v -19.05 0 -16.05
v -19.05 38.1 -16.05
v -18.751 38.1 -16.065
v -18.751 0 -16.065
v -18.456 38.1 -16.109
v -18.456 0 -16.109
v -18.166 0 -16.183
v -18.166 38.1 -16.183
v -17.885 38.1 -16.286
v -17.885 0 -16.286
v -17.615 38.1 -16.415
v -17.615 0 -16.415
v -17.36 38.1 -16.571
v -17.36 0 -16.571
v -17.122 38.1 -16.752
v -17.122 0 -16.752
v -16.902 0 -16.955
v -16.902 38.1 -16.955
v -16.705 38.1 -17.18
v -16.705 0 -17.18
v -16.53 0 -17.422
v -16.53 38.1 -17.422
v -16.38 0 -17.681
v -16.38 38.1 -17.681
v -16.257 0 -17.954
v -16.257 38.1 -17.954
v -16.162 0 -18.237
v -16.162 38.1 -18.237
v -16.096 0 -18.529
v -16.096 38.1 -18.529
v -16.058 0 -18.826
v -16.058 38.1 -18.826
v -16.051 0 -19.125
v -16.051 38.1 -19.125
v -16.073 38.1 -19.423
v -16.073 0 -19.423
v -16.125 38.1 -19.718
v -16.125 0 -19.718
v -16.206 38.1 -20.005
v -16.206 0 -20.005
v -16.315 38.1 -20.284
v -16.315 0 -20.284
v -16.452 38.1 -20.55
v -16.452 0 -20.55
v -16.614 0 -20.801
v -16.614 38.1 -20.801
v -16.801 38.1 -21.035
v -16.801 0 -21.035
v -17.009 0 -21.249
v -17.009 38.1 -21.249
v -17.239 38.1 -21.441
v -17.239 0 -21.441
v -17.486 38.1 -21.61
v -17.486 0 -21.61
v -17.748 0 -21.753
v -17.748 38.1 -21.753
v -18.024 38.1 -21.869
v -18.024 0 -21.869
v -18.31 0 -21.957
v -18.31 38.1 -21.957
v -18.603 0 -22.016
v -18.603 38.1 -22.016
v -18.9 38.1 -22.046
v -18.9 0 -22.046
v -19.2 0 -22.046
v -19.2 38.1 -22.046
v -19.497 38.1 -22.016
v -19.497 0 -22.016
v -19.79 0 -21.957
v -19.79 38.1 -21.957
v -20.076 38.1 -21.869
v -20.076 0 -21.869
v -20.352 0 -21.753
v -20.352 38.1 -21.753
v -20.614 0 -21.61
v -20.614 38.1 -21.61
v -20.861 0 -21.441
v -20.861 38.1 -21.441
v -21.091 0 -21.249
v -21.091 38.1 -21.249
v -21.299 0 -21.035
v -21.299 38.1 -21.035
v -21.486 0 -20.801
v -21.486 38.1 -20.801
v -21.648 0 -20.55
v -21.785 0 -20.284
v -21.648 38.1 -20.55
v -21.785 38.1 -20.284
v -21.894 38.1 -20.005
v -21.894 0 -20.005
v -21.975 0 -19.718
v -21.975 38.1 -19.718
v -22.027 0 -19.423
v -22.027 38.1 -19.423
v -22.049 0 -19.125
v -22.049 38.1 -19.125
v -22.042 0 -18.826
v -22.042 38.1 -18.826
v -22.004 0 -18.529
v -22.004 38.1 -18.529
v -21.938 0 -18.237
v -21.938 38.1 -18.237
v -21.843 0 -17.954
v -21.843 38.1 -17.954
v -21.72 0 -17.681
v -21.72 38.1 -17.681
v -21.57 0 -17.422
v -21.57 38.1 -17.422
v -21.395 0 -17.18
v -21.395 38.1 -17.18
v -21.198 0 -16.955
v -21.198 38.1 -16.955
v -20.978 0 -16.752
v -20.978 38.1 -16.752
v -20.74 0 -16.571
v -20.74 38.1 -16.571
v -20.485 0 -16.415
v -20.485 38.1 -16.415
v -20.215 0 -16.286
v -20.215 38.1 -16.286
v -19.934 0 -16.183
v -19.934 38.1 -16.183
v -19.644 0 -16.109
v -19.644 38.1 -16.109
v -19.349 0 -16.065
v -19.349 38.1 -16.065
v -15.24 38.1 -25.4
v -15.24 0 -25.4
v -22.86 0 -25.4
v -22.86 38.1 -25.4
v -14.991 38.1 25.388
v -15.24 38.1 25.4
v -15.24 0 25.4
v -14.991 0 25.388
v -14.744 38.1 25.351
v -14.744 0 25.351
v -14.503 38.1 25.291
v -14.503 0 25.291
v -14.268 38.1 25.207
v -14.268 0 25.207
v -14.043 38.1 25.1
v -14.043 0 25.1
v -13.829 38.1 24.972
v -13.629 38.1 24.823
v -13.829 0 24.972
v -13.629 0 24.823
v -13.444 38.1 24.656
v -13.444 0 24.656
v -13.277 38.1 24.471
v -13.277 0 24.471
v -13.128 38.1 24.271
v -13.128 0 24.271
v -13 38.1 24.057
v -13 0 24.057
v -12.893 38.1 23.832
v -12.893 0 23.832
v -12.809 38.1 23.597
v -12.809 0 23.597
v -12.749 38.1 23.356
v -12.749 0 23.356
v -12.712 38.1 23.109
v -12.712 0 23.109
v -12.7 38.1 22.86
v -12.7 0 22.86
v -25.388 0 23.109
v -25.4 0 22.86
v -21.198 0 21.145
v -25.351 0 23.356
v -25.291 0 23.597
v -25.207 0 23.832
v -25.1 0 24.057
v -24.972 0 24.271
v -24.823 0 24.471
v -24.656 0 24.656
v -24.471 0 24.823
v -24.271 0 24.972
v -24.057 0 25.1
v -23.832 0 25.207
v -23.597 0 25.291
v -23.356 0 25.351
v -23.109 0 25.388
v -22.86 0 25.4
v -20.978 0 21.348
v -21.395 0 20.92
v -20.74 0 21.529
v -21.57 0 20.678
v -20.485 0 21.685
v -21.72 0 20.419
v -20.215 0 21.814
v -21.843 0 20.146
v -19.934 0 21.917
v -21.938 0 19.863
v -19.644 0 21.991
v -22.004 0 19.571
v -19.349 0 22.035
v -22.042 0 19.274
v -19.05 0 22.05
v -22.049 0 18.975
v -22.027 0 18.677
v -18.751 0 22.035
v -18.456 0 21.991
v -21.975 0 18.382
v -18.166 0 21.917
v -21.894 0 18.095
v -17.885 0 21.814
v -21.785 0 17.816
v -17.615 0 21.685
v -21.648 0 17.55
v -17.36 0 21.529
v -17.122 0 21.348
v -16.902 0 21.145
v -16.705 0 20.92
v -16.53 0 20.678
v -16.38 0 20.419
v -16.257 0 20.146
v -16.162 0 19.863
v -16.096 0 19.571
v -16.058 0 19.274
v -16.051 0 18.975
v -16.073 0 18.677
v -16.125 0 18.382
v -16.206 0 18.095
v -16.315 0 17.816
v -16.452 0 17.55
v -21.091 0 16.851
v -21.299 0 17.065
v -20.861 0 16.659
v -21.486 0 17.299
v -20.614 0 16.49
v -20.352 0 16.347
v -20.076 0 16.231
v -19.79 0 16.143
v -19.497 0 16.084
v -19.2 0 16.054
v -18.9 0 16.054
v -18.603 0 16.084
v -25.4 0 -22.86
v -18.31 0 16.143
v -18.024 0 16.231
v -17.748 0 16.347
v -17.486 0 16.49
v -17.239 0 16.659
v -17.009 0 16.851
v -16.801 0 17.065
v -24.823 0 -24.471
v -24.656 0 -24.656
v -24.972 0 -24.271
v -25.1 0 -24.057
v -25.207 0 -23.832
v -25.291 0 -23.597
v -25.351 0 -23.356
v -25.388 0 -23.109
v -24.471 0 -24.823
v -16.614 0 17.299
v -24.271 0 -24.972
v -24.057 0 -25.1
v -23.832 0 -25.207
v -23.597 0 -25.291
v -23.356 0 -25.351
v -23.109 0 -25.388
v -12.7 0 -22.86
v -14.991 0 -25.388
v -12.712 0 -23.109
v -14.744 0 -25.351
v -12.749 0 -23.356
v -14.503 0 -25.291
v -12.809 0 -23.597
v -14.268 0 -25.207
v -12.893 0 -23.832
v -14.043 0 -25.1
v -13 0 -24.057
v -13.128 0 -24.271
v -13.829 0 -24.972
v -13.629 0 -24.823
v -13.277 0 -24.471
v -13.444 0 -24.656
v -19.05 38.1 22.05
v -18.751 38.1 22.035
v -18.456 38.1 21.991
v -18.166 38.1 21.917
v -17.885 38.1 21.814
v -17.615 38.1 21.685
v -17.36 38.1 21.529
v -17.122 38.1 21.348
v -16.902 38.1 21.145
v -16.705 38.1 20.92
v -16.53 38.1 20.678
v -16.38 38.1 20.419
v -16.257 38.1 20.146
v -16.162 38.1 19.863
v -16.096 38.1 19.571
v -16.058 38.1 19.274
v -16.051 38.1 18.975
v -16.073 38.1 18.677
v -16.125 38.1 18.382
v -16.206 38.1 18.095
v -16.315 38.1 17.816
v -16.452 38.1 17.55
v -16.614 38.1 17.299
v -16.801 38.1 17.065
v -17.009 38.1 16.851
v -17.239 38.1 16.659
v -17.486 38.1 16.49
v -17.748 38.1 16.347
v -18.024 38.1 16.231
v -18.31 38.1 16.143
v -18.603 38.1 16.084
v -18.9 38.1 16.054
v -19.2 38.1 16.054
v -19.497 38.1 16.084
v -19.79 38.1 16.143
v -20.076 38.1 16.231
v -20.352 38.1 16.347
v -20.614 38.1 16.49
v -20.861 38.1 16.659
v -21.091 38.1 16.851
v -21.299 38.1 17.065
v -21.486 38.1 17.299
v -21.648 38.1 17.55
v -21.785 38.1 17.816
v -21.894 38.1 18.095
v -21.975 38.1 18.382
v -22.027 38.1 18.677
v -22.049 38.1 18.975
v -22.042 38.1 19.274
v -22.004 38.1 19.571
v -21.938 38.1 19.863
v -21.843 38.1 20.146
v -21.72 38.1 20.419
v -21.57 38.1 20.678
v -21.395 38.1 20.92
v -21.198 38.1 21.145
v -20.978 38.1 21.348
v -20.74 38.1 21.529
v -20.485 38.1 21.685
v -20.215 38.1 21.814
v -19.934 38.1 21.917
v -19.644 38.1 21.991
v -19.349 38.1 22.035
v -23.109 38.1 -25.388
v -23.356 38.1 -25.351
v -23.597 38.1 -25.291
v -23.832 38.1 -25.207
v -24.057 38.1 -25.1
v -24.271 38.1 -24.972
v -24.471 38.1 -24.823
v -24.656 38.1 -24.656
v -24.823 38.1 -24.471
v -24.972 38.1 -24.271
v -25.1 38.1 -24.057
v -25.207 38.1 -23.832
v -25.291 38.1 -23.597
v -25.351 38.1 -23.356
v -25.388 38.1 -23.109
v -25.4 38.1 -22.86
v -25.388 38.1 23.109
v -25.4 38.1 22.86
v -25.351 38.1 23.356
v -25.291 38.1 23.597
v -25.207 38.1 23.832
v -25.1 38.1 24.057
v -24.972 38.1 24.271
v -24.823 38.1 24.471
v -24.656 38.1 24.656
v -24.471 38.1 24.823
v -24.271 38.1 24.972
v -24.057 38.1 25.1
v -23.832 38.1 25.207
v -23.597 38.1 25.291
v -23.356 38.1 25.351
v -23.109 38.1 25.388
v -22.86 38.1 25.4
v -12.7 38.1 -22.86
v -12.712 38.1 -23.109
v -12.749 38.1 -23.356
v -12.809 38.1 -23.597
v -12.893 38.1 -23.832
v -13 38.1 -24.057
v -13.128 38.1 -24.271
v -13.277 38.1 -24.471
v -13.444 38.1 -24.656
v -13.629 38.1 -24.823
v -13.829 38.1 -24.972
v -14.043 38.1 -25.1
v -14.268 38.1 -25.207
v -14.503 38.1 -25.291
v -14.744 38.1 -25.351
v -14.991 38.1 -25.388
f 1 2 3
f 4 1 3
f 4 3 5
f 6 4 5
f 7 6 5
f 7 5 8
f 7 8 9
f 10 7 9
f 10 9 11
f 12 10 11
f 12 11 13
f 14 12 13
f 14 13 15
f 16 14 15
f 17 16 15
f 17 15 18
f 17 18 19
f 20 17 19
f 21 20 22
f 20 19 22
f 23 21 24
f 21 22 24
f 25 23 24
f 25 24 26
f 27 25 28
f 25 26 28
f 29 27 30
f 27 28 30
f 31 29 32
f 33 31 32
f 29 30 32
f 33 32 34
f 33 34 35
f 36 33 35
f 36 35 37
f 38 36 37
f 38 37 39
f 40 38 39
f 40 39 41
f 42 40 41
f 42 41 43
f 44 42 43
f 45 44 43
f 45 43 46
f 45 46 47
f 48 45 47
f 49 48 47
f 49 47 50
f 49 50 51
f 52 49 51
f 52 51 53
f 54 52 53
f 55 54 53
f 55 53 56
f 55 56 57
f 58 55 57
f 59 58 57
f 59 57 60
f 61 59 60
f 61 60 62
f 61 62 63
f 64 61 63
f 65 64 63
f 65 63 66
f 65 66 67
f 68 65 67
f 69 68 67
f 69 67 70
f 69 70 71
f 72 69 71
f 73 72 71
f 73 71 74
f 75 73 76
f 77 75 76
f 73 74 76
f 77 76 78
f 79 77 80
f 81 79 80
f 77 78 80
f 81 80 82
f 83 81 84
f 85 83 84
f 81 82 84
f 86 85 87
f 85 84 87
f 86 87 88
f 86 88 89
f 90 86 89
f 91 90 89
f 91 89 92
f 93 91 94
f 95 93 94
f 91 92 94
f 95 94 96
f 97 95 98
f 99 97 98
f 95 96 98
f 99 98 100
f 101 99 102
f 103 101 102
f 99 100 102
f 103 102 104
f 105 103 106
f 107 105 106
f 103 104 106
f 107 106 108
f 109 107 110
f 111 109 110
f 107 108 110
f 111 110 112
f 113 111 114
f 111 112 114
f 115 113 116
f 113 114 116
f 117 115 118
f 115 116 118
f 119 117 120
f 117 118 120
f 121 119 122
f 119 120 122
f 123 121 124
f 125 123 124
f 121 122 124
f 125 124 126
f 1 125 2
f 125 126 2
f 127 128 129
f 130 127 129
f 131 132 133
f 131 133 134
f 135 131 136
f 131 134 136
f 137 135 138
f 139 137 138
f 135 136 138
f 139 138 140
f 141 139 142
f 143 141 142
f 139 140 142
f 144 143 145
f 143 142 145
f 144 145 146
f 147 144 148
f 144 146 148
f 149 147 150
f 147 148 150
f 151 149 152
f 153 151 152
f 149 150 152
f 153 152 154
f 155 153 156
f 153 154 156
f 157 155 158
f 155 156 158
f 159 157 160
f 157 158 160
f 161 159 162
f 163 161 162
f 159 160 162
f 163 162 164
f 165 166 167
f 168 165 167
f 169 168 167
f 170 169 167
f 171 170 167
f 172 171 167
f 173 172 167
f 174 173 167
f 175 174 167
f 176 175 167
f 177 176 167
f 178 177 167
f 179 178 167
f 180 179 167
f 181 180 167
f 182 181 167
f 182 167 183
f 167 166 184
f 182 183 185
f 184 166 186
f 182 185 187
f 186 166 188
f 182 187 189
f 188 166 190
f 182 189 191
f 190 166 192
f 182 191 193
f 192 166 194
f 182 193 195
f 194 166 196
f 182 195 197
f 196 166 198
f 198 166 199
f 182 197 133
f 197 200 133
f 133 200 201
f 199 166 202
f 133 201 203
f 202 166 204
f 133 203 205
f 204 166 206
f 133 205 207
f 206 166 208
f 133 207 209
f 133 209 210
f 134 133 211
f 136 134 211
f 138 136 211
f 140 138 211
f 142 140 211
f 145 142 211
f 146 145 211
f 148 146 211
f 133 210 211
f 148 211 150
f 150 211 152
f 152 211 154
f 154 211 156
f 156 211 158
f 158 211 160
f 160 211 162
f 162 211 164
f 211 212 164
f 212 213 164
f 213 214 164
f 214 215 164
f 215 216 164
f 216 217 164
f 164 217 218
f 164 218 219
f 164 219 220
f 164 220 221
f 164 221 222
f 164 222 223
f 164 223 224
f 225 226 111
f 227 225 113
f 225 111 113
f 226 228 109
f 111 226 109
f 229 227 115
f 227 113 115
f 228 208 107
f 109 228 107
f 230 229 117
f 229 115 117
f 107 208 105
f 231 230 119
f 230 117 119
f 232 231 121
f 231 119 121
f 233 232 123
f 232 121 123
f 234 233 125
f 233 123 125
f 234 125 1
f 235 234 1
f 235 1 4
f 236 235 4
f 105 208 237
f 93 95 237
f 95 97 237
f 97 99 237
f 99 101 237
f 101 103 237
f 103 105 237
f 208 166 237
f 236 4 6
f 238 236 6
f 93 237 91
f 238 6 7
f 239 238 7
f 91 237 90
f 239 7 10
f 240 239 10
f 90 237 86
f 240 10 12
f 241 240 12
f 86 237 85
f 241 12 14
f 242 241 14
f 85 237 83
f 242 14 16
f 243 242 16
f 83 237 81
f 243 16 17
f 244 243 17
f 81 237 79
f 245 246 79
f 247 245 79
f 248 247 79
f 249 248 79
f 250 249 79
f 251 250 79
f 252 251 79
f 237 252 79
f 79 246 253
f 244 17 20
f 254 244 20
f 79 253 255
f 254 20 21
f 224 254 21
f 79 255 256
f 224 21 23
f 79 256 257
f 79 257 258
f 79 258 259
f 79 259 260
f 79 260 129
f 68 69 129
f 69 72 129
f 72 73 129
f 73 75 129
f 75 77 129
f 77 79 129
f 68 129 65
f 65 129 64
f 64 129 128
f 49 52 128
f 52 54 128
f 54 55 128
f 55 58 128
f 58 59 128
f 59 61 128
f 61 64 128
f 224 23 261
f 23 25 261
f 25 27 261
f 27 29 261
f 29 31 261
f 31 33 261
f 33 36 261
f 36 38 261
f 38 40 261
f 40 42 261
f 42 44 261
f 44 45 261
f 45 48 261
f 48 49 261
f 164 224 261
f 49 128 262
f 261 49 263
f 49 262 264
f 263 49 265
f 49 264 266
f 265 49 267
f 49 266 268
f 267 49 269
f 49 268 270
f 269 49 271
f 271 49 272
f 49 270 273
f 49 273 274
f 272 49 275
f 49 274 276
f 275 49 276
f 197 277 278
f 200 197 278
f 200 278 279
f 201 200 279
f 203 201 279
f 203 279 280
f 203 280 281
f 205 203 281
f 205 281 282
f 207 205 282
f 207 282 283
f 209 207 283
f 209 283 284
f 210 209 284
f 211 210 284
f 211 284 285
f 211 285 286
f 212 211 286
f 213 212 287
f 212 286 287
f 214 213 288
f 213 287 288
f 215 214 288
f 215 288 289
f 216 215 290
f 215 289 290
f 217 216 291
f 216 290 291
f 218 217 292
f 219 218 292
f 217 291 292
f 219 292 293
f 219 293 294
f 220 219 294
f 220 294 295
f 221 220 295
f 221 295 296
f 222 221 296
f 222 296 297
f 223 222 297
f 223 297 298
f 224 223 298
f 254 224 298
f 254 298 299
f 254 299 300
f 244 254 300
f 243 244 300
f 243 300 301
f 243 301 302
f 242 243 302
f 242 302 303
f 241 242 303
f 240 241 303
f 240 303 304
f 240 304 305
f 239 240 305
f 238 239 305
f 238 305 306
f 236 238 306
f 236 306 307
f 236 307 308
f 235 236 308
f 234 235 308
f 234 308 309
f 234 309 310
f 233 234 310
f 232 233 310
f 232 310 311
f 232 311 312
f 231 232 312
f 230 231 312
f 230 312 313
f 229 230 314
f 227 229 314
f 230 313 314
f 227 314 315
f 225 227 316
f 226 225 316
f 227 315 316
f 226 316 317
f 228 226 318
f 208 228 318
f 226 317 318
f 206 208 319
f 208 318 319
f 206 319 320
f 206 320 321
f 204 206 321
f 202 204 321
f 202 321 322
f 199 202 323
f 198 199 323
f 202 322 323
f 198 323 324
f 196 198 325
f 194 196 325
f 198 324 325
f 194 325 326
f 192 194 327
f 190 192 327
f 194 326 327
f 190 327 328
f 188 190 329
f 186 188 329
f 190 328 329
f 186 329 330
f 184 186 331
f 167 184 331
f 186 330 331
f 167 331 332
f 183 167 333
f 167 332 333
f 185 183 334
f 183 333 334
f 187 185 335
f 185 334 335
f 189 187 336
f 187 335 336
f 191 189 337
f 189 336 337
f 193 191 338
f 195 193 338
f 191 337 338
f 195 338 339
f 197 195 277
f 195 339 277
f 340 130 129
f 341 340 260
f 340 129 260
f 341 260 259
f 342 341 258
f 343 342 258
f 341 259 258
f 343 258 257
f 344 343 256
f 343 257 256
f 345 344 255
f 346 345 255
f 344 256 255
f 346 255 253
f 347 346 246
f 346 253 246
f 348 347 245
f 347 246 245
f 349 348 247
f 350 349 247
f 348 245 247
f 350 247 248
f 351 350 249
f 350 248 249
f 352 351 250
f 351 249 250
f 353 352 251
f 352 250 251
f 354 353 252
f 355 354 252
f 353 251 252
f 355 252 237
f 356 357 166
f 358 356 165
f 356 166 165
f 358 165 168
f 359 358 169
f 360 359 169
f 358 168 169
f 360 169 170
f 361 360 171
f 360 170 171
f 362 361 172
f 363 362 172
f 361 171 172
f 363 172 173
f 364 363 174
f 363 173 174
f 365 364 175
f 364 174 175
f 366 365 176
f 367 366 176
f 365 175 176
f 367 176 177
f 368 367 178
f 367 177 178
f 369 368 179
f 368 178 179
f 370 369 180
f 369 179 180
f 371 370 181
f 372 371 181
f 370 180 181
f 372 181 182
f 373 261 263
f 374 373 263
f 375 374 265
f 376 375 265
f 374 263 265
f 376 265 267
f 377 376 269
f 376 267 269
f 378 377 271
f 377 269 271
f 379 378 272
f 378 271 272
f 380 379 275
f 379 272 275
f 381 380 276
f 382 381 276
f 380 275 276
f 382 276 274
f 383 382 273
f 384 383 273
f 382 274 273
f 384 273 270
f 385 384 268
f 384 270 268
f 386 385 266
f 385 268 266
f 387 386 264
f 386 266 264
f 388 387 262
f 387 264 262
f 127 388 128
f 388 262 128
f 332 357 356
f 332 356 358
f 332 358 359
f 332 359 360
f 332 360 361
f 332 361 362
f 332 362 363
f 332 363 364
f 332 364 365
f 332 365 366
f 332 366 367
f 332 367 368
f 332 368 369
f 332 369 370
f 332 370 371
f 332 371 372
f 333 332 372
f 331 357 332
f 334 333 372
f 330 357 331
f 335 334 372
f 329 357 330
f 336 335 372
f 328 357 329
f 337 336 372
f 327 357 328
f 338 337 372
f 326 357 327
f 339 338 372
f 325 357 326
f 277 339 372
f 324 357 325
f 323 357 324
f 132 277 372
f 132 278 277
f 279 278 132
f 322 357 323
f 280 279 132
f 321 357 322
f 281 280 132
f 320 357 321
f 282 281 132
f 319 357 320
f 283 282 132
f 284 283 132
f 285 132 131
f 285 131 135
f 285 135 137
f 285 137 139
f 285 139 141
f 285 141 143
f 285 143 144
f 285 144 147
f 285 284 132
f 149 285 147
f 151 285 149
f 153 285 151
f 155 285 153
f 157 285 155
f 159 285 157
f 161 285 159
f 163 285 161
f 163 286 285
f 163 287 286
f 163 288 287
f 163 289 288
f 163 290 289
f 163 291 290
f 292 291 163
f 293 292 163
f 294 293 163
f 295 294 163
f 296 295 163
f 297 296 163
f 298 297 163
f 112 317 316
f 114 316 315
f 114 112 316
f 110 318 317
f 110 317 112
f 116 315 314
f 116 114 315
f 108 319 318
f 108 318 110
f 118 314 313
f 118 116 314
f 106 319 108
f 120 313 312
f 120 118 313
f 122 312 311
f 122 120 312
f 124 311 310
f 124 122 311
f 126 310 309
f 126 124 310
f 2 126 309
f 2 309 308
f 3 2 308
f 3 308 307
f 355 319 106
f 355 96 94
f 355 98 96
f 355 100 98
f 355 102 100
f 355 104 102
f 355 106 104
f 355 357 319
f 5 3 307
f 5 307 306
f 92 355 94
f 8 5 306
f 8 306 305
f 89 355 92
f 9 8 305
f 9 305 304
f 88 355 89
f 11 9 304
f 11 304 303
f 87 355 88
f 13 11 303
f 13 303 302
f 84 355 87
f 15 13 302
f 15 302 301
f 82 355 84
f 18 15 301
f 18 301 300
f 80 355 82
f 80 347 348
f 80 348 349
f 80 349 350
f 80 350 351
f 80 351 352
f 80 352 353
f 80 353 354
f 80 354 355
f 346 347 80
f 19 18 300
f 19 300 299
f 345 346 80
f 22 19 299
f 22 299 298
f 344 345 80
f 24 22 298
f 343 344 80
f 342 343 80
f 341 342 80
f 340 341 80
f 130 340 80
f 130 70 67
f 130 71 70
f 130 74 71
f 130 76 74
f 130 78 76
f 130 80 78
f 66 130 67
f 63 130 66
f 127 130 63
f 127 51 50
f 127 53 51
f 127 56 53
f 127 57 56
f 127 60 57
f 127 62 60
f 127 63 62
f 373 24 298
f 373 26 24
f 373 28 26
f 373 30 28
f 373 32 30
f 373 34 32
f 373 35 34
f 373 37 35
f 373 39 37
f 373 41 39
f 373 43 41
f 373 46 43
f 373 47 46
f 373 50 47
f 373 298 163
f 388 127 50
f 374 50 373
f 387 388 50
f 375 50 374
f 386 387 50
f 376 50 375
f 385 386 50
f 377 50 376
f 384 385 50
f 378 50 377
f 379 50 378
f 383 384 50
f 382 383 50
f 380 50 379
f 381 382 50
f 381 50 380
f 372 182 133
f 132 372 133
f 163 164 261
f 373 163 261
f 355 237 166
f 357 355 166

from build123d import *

# Parameters (mm, degrees)
SKETCH2_R           = 2.05
BOSS_EXTRUDE1_DEPTH = 38.1
SKETCH3_R           = 3
CUT_EXTRUDE1_DEPTH  = 50


with BuildPart() as part:
    # Sketch2 → Boss-Extrude1 (new body)
    with BuildSketch(Plane(origin=(0, 0, 0), x_dir=(1, 0, 0), z_dir=(0, 1, 0))):
        with BuildLine():
            ThreePointArc((-25.4, -22.86), (-24.656051224, -24.656051224), (-22.86, -25.4))
            Line((-22.86, -25.4), (-15.24, -25.4))
            ThreePointArc((-15.24, -25.4), (-13.443948776, -24.656051224), (-12.7, -22.86))
            Line((-12.7, -22.86), (-12.7, 22.86))
            ThreePointArc((-12.7, 22.86), (-13.443948776, 24.656051224), (-15.24, 25.4))
            Line((-15.24, 25.4), (-19.05, 25.4))
            Line((-19.05, 25.4), (-22.86, 25.4))
            ThreePointArc((-22.86, 25.4), (-24.656051224, 24.656051224), (-25.4, 22.86))
            Line((-25.4, 22.86), (-25.4, 19.05))
            Line((-25.4, 19.05), (-25.4, -22.86))
        make_face()
        with Locations(Location((-19.05, -19.05, 0), (0, 0, 90))):
            Circle(SKETCH2_R, mode=Mode.SUBTRACT)
        with Locations(Location((-19.05, 19.05, 0), (0, 0, 90))):
            Circle(SKETCH2_R, mode=Mode.SUBTRACT)
    extrude(amount=BOSS_EXTRUDE1_DEPTH)

    # Sketch3 → Cut-Extrude1 (cut)
    with BuildSketch(Plane(origin=(0, 38.1, 0), x_dir=(1, 0, 0), z_dir=(0, 1, 0))):
        with Locations(Location((-19.05, 19.05, 0), (0, 0, 270))):
            Circle(SKETCH3_R)
        with Locations(Location((-19.05, -19.05, 0), (0, 0, 270))):
            Circle(SKETCH3_R)
    extrude(amount=-CUT_EXTRUDE1_DEPTH, mode=Mode.SUBTRACT)


solid = part.part
